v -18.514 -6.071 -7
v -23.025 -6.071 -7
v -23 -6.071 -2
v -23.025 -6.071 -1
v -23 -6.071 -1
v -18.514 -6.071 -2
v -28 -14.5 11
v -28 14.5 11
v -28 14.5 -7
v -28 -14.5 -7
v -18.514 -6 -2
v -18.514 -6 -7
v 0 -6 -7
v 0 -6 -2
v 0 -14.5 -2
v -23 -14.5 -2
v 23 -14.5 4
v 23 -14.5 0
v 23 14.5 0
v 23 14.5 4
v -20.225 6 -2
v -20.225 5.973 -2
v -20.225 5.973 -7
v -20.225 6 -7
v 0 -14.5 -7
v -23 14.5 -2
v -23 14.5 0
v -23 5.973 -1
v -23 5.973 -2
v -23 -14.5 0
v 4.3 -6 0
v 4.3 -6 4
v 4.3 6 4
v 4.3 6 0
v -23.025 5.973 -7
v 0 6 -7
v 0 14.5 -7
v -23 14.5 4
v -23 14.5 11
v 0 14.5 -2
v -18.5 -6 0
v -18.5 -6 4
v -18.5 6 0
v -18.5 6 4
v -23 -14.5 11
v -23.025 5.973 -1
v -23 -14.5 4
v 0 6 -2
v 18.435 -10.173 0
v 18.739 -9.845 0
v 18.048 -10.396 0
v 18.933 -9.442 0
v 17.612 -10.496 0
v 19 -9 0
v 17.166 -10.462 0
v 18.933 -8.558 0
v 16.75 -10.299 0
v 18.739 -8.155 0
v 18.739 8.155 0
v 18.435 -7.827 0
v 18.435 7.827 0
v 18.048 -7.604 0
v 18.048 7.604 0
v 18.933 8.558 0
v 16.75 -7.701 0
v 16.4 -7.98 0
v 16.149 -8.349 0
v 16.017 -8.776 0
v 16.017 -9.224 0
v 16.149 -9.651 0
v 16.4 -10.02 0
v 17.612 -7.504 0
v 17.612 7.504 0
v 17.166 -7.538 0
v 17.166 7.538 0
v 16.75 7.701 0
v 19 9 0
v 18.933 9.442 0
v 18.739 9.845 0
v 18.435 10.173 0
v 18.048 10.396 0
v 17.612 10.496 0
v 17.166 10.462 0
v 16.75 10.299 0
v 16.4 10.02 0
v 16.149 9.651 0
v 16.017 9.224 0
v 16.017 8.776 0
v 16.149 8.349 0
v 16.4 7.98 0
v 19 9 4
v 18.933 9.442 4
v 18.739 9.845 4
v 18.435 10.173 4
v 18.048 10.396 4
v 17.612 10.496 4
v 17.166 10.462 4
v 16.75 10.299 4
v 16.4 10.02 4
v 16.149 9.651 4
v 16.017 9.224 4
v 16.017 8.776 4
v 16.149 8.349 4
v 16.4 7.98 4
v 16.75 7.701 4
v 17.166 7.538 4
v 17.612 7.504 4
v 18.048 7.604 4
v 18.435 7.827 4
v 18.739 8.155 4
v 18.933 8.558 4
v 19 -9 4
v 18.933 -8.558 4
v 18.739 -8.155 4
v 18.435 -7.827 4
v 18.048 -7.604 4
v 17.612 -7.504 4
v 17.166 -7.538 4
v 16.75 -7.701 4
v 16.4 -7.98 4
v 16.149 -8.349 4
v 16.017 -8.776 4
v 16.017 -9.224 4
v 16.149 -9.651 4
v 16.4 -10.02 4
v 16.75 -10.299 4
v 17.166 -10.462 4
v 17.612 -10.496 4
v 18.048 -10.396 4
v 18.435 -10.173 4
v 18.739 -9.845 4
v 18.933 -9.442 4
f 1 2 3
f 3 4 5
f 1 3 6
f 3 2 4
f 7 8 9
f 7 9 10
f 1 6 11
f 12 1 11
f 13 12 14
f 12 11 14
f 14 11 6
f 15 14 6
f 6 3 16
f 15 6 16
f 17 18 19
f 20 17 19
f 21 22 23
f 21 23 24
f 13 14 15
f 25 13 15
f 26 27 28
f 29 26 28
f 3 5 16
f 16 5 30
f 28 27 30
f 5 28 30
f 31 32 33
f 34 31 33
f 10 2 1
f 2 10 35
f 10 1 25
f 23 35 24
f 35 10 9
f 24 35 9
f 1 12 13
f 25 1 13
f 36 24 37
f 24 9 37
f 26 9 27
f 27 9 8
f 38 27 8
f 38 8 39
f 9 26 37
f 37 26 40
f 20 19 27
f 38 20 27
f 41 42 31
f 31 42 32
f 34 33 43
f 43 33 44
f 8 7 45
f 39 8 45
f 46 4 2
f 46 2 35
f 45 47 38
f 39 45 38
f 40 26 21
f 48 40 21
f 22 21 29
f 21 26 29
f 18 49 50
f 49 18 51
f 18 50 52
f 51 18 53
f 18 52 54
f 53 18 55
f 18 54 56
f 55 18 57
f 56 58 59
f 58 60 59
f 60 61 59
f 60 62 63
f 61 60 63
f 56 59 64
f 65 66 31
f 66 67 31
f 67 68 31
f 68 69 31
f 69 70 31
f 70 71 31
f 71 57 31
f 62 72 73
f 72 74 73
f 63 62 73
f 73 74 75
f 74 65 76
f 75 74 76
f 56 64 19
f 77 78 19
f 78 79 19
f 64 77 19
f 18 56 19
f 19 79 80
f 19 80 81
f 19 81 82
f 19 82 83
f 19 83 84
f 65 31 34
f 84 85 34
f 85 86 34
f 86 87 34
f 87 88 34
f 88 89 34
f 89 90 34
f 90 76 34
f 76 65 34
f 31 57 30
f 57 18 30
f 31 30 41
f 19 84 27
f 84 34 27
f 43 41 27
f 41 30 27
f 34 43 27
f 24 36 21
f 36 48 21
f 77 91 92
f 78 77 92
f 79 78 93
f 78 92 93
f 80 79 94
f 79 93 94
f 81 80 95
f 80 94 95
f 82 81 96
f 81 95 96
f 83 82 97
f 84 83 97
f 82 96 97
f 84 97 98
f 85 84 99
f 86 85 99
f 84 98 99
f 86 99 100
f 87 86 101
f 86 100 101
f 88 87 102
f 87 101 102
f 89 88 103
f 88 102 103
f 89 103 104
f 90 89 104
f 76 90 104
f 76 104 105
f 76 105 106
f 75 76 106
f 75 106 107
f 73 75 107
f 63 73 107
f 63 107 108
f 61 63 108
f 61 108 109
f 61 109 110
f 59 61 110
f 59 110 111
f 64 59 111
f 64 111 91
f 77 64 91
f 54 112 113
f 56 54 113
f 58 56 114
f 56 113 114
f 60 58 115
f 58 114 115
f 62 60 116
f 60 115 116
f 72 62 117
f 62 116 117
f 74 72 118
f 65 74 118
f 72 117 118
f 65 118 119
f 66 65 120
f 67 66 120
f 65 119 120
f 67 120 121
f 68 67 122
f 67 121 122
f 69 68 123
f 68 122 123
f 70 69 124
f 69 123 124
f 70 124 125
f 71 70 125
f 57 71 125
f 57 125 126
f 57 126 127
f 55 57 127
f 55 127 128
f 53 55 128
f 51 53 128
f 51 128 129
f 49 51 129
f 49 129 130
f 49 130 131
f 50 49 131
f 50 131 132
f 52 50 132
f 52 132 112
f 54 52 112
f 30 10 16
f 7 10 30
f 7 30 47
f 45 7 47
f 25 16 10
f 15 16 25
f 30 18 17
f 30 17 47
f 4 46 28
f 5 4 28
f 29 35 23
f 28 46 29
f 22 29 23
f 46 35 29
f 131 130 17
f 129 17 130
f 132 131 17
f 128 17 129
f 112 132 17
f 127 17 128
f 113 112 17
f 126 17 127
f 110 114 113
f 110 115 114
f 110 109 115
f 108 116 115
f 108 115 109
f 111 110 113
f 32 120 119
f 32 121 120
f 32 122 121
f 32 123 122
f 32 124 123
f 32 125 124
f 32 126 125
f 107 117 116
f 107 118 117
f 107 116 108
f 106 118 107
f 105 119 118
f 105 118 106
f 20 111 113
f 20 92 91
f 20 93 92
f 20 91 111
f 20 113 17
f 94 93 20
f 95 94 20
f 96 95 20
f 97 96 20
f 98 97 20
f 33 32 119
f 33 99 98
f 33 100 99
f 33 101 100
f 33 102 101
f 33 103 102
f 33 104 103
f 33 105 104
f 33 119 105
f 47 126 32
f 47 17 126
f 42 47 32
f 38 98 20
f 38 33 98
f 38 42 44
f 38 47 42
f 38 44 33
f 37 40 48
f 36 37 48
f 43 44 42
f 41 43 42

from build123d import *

# Parameters (mm, degrees)
CROQUIS1_W              = 29
CROQUIS1_H              = 46
SALIENTE_EXTRUIR1_DEPTH = 4
CROQUIS2_W              = 5
CROQUIS2_H              = 29
SALIENTE_EXTRUIR2_DEPTH = 7
CROQUIS3_W              = 5
CROQUIS3_H              = 29
SALIENTE_EXTRUIR3_DEPTH = 21
CROQUIS4_W              = 29
CROQUIS4_H              = 15
SALIENTE_EXTRUIR4_DEPTH = 28
CROQUIS5_R              = 1.5
CORTAR_EXTRUIR1_DEPTH   = 28
CROQUIS6_W              = 28
CROQUIS6_H              = 10
CORTAR_EXTRUIR2_DEPTH   = 60
CORTAR_EXTRUIR3_START   = -5
CROQUIS7_W              = 4.510634874
CROQUIS7_H              = 12.04330307
CORTAR_EXTRUIR3_DEPTH   = 60
CORTAR_EXTRUIR4_START   = -5
CROQUIS8_W              = 3.464680309
CROQUIS8_H              = 12
CORTAR_EXTRUIR4_DEPTH   = 60


with BuildPart() as part:
    # Croquis1 → Saliente-Extruir1 (new body)
    with BuildSketch(Plane(origin=(0, 0, 0), x_dir=(0, 1, 0), z_dir=(0, 0, 1))):
        Rectangle(CROQUIS1_W, CROQUIS1_H)
    extrude(amount=SALIENTE_EXTRUIR1_DEPTH)



with BuildPart() as body_2:
    # Croquis2 → Saliente-Extruir2 (new body)
    with BuildSketch(Plane.XY.offset(4)):
        with Locations((-25.5, 0)):
            Rectangle(CROQUIS2_W, CROQUIS2_H)
    extrude(amount=SALIENTE_EXTRUIR2_DEPTH)


with BuildPart() as part_1:
    add(part.part)

    add(body_2.part)  # Saliente-Extruir3 merges body 2
    # Croquis3 → Saliente-Extruir3 (add)
    with BuildSketch(Plane(origin=(0, 0, 4), x_dir=(1, 0, 0), z_dir=(0, 0, -1))):
        with Locations((-25.5, 0)):
            Rectangle(CROQUIS3_W, CROQUIS3_H)
    extrude(amount=SALIENTE_EXTRUIR3_DEPTH)

    # Croquis4 → Saliente-Extruir4 (add)
    with BuildSketch(Plane(origin=(-28, 0, 0), x_dir=(0, -1, 0), z_dir=(-1, 0, 0))):
        with Locations((0, -9.5)):
            Rectangle(CROQUIS4_W, CROQUIS4_H)
    extrude(amount=-SALIENTE_EXTRUIR4_DEPTH)

    # Croquis5 → Cortar-Extruir1 (cut)
    with BuildSketch(Plane.XY.offset(4)):
        with Locations((17.5, -9)):
            Circle(CROQUIS5_R)
        with Locations((17.5, 9)):
            Circle(CROQUIS5_R)
        Polygon((-18.5, 0), (-18.5, -6), (4.3, -6), (4.3, 6), (-18.5, 6), align=None)
    extrude(amount=-CORTAR_EXTRUIR1_DEPTH, mode=Mode.SUBTRACT)

    # Croquis6 → Cortar-Extruir2 (cut)
    with BuildSketch(Plane(origin=(0, 14.5, 0), x_dir=(1, 0, 0), z_dir=(0, 1, 0))):
        with Locations((-14, 12)):
            Rectangle(CROQUIS6_W, CROQUIS6_H)
    extrude(amount=-CORTAR_EXTRUIR2_DEPTH, mode=Mode.SUBTRACT)

    # Croquis7 → Cortar-Extruir3 (cut)
    with BuildSketch(Plane.XY.offset(4).offset(CORTAR_EXTRUIR3_START)):
        with Locations((-20.769799618, -0.048913864)):
            Rectangle(CROQUIS7_W, CROQUIS7_H)
    extrude(amount=-CORTAR_EXTRUIR3_DEPTH, mode=Mode.SUBTRACT)

    # Croquis8 → Cortar-Extruir4 (cut)
    with BuildSketch(Plane.XY.offset(4).offset(CORTAR_EXTRUIR4_START)):
        with Locations((-18.492763456, 0)):
            Rectangle(CROQUIS8_W, CROQUIS8_H)
    extrude(amount=-CORTAR_EXTRUIR4_DEPTH, mode=Mode.SUBTRACT)


solid = part_1.part
